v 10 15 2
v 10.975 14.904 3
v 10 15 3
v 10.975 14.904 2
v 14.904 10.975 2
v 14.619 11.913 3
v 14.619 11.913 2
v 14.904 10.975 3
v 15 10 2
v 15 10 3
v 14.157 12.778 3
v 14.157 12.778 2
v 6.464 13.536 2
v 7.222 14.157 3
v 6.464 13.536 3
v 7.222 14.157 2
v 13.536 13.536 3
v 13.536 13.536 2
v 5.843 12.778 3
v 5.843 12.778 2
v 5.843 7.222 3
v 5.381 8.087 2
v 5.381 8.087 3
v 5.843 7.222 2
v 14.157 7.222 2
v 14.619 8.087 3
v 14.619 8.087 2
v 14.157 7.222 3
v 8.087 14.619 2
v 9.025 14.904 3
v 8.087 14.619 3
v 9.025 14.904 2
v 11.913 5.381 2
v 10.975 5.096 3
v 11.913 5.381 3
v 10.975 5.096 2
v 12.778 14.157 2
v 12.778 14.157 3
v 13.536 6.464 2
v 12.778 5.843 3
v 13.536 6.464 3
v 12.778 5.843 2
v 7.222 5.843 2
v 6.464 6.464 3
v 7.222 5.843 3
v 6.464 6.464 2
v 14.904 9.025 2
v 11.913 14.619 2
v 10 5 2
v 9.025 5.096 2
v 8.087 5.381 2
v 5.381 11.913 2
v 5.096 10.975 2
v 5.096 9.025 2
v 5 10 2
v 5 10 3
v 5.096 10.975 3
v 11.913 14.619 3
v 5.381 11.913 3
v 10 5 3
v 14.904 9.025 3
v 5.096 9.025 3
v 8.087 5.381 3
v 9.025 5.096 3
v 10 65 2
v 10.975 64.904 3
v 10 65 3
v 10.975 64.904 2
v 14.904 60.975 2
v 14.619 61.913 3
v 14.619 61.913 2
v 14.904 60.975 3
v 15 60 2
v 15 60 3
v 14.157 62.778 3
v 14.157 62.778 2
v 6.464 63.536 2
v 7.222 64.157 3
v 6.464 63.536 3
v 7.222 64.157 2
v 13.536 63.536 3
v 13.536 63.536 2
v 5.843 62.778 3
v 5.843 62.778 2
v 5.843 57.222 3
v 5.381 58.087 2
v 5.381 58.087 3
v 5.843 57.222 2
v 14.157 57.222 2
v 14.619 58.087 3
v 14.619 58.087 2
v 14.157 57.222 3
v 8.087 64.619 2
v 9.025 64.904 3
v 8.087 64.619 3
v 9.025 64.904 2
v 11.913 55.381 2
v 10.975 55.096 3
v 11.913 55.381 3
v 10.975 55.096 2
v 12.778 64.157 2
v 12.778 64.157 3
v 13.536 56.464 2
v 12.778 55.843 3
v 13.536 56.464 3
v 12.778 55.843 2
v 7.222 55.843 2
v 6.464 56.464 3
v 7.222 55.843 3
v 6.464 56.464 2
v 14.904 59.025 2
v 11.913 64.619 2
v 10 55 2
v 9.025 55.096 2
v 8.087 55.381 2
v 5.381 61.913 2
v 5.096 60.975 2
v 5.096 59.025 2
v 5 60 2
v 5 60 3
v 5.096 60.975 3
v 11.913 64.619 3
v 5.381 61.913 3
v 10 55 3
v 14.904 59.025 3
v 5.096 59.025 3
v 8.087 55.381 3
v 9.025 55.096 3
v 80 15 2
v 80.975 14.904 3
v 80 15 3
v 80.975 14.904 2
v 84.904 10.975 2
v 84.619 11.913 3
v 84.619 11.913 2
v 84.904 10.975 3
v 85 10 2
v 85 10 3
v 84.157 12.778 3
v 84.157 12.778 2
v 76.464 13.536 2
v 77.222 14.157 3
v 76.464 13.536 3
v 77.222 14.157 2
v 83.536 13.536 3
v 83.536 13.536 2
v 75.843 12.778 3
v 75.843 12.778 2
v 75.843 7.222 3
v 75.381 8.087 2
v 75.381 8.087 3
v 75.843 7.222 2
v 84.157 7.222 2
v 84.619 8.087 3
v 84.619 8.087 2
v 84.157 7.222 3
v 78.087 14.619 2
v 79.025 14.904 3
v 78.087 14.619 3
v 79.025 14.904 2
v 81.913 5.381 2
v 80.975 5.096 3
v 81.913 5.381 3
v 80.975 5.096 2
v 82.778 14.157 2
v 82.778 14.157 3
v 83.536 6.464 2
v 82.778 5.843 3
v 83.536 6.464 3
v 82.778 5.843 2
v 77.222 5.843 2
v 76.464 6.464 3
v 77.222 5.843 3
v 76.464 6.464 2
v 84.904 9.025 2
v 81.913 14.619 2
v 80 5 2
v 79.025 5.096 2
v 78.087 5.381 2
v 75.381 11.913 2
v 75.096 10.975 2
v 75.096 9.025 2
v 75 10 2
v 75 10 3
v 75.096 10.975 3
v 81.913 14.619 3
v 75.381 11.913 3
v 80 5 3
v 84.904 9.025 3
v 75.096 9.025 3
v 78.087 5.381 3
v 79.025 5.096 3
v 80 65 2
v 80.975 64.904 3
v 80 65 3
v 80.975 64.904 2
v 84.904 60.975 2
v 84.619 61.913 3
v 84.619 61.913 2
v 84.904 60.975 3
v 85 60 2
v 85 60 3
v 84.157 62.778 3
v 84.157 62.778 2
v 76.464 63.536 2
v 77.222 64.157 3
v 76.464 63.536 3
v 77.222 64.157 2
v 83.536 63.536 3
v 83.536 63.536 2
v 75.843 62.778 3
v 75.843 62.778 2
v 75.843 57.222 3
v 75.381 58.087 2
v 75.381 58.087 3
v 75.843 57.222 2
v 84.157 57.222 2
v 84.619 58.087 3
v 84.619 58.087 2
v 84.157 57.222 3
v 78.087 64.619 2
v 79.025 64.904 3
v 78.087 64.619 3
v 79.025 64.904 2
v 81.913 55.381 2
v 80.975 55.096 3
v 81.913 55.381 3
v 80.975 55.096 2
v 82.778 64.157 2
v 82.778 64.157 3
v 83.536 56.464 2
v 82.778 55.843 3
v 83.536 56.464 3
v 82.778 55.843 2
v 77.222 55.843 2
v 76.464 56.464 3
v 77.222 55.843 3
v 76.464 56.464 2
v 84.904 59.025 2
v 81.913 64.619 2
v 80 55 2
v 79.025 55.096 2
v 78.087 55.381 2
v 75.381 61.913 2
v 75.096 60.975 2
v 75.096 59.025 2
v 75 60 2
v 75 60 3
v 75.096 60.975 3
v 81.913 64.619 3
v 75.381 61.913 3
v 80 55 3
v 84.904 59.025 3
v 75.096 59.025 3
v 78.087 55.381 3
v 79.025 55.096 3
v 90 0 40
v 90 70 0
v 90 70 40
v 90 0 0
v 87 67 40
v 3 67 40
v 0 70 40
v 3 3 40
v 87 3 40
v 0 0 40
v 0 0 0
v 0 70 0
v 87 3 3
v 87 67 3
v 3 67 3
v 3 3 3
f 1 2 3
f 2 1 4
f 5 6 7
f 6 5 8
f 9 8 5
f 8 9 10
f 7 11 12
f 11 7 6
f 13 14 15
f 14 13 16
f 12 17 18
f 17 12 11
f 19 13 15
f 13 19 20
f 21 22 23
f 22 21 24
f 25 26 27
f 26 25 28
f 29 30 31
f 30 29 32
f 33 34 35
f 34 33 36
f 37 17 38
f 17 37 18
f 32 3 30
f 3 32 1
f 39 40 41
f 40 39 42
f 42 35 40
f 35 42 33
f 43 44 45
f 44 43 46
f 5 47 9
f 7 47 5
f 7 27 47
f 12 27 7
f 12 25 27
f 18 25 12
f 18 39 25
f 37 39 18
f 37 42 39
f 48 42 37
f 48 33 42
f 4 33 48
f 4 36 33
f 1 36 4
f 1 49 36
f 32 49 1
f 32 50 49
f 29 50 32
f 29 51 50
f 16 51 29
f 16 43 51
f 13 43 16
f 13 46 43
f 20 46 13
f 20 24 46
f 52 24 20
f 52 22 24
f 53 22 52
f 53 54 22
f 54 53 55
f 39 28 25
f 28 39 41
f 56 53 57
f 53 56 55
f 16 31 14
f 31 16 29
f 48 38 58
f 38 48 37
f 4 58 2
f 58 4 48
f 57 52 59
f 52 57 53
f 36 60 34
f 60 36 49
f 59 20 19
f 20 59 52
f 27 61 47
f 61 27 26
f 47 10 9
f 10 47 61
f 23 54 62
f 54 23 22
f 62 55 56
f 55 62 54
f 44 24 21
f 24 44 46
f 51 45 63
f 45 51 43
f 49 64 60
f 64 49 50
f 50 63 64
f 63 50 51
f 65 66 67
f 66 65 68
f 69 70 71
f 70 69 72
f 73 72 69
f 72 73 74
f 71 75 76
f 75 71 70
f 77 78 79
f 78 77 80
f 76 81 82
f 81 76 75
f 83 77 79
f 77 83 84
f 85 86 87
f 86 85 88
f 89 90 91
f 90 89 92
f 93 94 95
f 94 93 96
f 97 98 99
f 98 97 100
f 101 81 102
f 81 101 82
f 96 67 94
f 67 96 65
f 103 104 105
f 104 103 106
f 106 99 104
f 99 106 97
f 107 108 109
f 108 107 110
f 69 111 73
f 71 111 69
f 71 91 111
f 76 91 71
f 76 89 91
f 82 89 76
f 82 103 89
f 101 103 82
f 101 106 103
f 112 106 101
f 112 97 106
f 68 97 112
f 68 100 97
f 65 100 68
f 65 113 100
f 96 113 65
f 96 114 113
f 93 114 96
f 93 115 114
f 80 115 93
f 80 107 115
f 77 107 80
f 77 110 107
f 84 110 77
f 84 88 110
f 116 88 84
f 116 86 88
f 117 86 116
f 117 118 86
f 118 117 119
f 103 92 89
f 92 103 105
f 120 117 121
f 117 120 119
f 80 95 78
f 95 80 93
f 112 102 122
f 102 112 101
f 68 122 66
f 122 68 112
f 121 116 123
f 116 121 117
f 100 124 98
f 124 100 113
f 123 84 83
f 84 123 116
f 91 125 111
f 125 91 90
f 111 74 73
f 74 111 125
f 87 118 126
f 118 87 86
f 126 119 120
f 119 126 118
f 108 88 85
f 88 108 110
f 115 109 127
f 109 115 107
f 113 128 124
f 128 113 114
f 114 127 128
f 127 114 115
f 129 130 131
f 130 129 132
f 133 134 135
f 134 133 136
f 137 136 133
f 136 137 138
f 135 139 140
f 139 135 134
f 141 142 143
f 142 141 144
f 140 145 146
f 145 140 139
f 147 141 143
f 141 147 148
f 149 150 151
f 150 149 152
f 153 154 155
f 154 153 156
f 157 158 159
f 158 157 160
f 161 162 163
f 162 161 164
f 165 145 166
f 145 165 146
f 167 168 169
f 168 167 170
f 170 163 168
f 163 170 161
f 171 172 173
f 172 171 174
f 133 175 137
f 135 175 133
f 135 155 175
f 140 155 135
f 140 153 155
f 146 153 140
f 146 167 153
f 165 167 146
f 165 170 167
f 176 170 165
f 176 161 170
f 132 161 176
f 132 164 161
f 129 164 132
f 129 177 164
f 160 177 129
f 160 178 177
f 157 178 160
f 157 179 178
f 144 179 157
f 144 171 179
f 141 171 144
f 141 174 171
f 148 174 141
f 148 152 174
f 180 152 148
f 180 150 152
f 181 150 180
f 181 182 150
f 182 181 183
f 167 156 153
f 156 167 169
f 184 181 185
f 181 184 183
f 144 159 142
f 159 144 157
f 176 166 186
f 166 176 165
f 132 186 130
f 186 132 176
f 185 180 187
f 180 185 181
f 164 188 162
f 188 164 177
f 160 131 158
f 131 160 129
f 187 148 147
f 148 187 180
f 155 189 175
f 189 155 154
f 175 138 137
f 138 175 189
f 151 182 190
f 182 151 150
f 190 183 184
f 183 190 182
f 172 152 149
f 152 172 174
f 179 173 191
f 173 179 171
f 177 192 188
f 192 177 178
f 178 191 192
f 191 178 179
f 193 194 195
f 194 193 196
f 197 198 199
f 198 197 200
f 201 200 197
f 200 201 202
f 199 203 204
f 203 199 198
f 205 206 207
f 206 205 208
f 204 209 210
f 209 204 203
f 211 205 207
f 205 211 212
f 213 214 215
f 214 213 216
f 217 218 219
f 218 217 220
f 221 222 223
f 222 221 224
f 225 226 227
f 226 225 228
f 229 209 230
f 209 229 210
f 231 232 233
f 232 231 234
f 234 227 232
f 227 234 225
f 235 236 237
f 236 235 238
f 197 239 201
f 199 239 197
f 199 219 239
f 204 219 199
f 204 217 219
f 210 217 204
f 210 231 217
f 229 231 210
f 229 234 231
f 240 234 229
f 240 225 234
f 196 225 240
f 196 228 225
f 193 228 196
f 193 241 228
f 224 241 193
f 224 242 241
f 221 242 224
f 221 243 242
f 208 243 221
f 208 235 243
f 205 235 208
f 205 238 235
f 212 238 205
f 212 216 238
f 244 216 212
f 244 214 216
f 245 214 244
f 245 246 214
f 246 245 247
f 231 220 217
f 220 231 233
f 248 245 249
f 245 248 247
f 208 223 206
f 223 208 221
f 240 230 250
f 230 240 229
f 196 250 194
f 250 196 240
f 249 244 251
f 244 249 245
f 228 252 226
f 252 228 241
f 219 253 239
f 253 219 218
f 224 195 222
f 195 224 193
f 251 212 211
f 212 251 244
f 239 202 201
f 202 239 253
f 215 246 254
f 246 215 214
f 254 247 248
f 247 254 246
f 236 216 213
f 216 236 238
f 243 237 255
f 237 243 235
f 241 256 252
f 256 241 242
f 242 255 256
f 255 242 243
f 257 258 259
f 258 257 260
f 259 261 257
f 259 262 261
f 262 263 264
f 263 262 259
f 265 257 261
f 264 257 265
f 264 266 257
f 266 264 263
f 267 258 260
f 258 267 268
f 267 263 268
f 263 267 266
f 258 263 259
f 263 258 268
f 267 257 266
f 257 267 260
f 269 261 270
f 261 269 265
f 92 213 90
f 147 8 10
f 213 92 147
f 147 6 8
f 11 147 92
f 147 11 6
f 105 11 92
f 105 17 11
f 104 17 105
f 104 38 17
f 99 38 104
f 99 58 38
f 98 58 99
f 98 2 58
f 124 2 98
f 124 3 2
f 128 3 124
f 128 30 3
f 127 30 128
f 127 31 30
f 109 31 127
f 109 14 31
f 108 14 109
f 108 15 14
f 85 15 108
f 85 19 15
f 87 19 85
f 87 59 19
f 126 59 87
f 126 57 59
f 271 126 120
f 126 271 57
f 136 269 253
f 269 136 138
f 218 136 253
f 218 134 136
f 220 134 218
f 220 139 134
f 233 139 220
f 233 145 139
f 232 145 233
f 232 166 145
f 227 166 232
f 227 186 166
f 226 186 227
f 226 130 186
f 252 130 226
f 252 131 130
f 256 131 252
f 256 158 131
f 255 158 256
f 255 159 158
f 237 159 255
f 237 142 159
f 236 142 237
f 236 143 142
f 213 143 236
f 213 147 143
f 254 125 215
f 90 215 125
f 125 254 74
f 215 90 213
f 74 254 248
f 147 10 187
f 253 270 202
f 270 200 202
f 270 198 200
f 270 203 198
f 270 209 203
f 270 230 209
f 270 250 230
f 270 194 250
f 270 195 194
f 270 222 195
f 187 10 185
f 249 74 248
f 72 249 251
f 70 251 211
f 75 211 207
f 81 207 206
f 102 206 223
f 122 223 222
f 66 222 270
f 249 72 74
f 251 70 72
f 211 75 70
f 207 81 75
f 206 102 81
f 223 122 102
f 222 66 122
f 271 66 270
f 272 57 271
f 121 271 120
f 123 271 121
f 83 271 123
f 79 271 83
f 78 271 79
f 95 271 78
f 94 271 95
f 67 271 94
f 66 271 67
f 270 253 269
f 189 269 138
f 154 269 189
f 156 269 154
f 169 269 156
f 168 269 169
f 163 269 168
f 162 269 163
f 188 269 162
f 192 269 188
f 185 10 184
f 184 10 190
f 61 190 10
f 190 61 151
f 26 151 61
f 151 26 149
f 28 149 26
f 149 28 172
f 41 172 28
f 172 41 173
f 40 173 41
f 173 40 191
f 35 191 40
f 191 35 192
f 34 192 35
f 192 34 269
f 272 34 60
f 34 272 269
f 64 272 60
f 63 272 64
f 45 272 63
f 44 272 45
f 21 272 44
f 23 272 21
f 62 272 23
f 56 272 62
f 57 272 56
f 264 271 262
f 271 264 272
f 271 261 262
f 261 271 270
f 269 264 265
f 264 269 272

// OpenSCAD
$fn = 32;

// ----------------------------------------------------------------------
// Enclosure box: bosses enclosure
// ----------------------------------------------------------------------

// --- parameters (mm) ---
box_l = 90;               // outer length, X
box_w = 70;               // outer width, Y
box_h = 40;               // outer height
wall_t = 3;               // wall thickness
boss_r = 5;               // corner boss radius
hole_r = 2;               // boss screw hole radius
boss_in = 10;             // boss inset from the corners

inner_h = box_h - wall_t;  // cavity depth
boss_h = inner_h - 2;  // corner boss height

difference() {
  cube([box_l, box_w, box_h]);
  translate([wall_t, wall_t, wall_t])
    cube([box_l - 2 * wall_t, box_w - 2 * wall_t, box_h]);
  for (sx = [0, 1], sy = [0, 1])
    translate([sx ? box_l - boss_in : boss_in,
               sy ? box_w - boss_in : boss_in, wall_t - 1]) {
      cylinder(r = boss_r, h = boss_h);
      translate([0, 0, boss_h - 4])
        cylinder(r = hole_r, h = 5);
    }
}
